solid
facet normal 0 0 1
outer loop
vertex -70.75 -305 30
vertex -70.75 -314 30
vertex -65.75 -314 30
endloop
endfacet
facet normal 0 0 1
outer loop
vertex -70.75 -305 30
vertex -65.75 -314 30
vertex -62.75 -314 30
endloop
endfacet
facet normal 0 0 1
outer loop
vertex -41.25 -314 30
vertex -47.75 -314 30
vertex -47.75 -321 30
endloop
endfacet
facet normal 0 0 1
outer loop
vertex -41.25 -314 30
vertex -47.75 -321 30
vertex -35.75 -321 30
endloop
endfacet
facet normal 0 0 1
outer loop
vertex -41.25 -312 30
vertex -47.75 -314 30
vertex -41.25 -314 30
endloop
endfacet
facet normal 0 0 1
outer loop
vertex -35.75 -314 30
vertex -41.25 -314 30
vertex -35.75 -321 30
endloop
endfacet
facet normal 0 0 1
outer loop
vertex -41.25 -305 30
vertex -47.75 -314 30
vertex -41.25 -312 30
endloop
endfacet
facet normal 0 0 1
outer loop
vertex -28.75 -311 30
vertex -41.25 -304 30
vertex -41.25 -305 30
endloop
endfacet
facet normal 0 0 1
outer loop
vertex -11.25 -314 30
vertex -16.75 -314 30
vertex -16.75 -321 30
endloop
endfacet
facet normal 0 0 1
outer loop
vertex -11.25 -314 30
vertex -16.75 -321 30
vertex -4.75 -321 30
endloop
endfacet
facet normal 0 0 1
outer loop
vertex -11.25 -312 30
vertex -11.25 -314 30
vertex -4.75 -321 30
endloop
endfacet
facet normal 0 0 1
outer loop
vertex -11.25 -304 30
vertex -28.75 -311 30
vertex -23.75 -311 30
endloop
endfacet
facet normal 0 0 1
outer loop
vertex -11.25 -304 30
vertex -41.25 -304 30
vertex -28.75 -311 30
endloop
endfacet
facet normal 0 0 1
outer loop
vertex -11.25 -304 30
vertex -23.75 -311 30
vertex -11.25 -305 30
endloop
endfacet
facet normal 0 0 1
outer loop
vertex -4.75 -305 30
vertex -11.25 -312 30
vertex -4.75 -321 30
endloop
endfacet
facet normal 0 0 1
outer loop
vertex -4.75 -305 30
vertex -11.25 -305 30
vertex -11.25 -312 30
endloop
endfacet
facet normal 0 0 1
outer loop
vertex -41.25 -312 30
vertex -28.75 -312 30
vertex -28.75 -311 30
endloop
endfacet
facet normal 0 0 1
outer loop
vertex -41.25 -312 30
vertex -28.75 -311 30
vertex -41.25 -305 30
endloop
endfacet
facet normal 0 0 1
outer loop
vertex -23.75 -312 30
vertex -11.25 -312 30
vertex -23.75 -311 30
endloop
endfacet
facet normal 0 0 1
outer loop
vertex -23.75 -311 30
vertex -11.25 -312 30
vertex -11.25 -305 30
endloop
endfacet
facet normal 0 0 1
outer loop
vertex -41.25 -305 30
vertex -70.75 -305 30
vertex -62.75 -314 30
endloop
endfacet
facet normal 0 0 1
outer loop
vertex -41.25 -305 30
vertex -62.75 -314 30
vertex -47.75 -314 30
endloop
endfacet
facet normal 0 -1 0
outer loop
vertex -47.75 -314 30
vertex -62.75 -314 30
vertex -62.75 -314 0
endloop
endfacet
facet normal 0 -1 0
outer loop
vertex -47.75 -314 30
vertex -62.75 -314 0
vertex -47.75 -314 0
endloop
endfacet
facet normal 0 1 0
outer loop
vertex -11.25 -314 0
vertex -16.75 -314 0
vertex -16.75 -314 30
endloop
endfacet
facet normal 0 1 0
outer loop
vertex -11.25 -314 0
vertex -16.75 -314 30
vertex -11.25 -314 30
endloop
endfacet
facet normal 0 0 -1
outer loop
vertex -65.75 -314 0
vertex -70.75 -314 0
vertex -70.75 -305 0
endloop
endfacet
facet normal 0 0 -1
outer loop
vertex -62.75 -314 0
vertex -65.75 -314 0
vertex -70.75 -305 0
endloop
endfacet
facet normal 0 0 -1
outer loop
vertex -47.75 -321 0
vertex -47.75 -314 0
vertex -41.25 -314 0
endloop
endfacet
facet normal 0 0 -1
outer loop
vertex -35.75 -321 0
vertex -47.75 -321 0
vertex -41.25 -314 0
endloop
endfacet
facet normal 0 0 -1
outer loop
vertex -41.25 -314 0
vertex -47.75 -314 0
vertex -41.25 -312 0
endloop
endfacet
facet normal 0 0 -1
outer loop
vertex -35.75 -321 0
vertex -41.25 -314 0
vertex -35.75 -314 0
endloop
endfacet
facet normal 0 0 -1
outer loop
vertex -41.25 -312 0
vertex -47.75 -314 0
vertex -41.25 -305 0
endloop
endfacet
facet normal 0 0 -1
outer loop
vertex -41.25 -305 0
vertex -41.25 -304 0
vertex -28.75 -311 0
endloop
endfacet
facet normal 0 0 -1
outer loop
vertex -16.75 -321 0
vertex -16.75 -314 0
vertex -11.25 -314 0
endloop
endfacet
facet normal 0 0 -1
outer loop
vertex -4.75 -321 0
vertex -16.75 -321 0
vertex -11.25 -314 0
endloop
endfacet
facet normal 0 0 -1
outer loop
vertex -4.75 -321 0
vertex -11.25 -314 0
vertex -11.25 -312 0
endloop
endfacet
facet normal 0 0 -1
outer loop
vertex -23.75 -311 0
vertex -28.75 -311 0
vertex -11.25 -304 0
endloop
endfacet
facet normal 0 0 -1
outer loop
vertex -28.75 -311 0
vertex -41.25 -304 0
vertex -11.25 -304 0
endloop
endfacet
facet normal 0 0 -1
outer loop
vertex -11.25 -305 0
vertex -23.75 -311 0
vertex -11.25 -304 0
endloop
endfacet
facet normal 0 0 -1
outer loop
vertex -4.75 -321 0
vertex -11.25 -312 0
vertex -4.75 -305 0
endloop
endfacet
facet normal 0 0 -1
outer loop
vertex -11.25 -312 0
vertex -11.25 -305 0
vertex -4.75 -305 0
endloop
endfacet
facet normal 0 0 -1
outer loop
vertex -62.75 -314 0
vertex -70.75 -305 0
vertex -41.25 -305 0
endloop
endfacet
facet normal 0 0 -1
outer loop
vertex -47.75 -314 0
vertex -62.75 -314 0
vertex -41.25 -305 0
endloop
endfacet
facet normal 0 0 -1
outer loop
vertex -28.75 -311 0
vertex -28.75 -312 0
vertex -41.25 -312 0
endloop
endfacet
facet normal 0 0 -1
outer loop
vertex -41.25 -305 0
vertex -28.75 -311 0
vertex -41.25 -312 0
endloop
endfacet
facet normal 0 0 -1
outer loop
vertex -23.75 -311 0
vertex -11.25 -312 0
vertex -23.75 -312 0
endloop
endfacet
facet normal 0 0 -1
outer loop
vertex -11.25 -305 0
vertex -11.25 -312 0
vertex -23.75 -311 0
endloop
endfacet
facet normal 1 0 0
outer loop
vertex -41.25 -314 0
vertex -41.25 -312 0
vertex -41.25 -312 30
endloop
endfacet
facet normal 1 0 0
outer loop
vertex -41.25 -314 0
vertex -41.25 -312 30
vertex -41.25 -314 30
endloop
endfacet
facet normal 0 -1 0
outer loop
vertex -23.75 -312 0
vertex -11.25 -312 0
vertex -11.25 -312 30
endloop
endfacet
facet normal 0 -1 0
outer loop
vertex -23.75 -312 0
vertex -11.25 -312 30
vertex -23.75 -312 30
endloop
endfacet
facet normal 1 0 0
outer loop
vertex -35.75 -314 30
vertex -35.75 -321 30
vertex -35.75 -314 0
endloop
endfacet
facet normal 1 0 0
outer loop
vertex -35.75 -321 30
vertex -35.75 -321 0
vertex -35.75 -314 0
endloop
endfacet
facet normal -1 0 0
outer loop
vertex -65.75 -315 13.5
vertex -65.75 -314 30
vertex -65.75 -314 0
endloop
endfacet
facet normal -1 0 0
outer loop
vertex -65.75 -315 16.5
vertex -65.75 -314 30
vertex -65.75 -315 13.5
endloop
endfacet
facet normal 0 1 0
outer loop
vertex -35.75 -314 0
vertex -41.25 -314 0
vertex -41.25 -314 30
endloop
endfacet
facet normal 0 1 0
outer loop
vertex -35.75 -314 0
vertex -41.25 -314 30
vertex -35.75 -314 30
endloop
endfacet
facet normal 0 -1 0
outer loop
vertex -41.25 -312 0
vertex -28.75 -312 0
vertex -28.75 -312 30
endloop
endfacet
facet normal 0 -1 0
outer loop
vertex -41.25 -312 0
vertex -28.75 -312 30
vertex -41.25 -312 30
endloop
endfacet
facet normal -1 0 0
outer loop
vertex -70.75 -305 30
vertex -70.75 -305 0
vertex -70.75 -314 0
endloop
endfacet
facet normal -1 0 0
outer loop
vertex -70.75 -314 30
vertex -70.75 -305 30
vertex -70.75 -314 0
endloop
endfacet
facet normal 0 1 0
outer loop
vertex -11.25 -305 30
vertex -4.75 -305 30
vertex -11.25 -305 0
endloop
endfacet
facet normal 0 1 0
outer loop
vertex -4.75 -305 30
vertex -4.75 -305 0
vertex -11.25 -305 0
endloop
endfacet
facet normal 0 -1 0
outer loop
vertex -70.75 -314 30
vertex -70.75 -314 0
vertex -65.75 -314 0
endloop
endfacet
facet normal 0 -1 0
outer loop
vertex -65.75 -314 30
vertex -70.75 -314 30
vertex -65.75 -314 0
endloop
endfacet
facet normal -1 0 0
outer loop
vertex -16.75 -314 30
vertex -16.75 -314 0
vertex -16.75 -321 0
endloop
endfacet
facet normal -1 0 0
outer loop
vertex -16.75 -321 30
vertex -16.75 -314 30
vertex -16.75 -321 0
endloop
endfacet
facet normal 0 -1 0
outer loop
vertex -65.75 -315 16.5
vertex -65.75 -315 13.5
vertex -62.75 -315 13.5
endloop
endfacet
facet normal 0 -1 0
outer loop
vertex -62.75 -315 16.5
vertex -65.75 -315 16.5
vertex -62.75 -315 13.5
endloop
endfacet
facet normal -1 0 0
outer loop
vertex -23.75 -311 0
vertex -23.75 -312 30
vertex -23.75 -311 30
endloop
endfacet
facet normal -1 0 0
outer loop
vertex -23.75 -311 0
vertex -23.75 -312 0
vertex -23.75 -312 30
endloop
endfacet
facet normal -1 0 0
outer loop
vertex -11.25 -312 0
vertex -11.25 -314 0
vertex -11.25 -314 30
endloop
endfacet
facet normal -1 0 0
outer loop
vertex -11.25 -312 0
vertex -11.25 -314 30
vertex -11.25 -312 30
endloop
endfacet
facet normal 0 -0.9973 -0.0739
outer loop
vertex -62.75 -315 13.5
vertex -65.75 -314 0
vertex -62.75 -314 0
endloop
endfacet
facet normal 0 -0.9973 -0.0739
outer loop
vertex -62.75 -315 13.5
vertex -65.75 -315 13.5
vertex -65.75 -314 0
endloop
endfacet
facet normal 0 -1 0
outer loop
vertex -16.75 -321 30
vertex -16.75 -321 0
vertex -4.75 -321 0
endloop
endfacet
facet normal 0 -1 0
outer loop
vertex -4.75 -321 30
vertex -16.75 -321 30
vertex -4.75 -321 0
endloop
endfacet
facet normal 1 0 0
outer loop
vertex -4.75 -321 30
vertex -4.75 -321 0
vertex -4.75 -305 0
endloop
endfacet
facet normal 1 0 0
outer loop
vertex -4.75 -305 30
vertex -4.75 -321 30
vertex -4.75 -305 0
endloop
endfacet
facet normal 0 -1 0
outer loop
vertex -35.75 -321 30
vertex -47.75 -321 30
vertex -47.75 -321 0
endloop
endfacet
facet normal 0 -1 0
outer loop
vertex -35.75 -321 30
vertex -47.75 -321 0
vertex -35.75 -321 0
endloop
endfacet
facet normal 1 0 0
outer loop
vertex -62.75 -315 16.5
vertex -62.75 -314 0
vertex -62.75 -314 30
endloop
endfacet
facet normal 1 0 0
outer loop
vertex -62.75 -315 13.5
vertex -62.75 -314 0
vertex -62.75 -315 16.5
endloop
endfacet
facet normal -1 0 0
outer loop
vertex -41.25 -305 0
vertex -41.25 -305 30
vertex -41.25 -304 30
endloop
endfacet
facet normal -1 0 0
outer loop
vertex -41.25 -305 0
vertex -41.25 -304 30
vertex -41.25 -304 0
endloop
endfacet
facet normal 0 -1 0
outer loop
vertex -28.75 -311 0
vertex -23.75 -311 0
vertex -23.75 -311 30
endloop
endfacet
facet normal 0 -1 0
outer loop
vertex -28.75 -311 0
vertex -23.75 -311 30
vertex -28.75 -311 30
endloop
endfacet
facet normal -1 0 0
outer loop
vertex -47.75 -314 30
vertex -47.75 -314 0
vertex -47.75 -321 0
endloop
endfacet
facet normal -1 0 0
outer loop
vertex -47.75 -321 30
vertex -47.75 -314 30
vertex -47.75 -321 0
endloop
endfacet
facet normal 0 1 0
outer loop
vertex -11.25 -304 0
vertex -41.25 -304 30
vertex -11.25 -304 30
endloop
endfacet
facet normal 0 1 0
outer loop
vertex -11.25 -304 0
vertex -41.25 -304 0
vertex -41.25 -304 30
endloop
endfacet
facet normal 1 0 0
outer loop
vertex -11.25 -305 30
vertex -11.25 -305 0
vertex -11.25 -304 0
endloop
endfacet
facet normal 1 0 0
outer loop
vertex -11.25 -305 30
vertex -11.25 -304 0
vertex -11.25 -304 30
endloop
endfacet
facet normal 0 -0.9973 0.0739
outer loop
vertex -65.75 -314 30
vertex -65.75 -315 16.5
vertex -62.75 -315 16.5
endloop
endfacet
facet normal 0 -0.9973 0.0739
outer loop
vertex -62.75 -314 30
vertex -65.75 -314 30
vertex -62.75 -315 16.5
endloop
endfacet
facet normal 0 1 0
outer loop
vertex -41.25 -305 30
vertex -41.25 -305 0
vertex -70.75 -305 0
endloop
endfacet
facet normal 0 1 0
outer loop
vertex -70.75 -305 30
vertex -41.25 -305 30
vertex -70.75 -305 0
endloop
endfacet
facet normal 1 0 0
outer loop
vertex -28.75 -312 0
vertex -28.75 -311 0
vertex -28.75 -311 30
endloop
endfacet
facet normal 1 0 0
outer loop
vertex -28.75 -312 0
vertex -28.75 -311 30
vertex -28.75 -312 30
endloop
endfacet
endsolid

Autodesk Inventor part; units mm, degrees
ref_plane "YZ Plane" through (0, 0, 0) normal (1, 0, 0) x (0, 1, 0)
ref_plane "XZ Plane" through (0, 0, 0) normal (0, 1, 0) x (-1, 0, 0)
ref_plane "XY Plane" through (0, 0, 0) normal (0, 0, 1) x (1, 0, 0)
sketch "Skizze1" plane through (0, 0, 0) normal (0, 0, 1) x (1, 0, 0)
  line L0 (-41.25, -314) -> (-33.75, -314) projected
  line L1 (-41.25, -312) -> (-41.25, -314) projected
  line L2 (-11.25, -312) -> (-41.25, -312) projected
  line L3 (-18.75, -314) -> (-11.25, -314) projected
  line L4 (-11.25, -314) -> (-11.25, -312) projected
  line L5 (-18.75, -314) -> (-16.75, -314)
  line L6 (-16.75, -314) -> (-16.75, -321)
  line L7 (-16.75, -321) -> (-4.75, -321)
  line L8 (-4.75, -321) -> (-4.75, -305)
  line L9 (-4.75, -305) -> (-70.75, -305)
  line L10 (-70.75, -305) -> (-70.75, -314)
  line L11 (-47.75, -314) -> (-47.75, -321)
  line L12 (-47.75, -321) -> (-35.75, -321)
  line L13 (-35.75, -321) -> (-35.75, -314)
  line L14 (-35.75, -314) -> (-33.75, -314)
  line L15 (-70.75, -314) -> (-65.75, -314)
  line L16 (-65.75, -314) -> (-65.75, -315)
  line L17 (-65.75, -315) -> (-62.75, -315)
  line L18 (-62.75, -315) -> (-62.75, -314)
  line L19 (-62.75, -314) -> (-47.75, -314)
  line L20 (-23.75, -312) -> (-23.75, -311)
  line L21 (-23.75, -311) -> (-26.25, -311)
  line L22 (-26.25, -311) -> (-28.75, -311)
  line L23 (-28.75, -311) -> (-28.75, -312)
  line L24 (-26.25, -311) -> (-26.25, -312) construction
  point P0 (0, 0)
  point P1 (-64.25, -315)
  dimension "d0" = 2
  dimension "d1" = 7
  dimension "d2" = 12
  dimension "d3" = 16
  dimension "d4" = 12
  dimension "d5" = 2
  dimension "d6" = 3
  dimension "d7" = 38
  dimension "d8" = 5
  dimension "d9" = 1
  dimension "d20" = 1
  dimension "d21" = 5
extrude "Extrusion1" add sketch "Skizze1" along normal blind 30 contours L0 L13 L12 L11 L19 L18 L17 L16 L15 L10 L9 L8 L7 L6 L3 L4 L2 L20 L21 L22 L23 L1
chamfer "Fasen1" distance 1 distance2 13.5 1 edges at (-64.25, -315, 30) measured on face at (-34.75, -307, 30)
chamfer "Fasen2" distance 1 distance2 13.5 1 edges at (-64.25, -315, 0) measured on face at (-34.75, -307, 0)
sketch "Skizze2" plane through (-70.75, -305, 0) normal (0, 1, 0) x (1, 0, 0)
  line L0 (29.5, 0) -> (59.5, 0) projected
  line L1 (59.5, 0) -> (59.5, -30) projected
  line L2 (29.5, 0) -> (59.5, 0)
  line L3 (59.5, 0) -> (59.5, -30)
  line L4 (59.5, -30) -> (29.5, -30)
  line L5 (29.5, -30) -> (29.5, 0)
  point P0 (70.75, 0)
extrude "Extrusion2" add sketch "Skizze2" along normal blind 1
properties part number "KatzeFEM" material "Aluminium 6061, Katze"
